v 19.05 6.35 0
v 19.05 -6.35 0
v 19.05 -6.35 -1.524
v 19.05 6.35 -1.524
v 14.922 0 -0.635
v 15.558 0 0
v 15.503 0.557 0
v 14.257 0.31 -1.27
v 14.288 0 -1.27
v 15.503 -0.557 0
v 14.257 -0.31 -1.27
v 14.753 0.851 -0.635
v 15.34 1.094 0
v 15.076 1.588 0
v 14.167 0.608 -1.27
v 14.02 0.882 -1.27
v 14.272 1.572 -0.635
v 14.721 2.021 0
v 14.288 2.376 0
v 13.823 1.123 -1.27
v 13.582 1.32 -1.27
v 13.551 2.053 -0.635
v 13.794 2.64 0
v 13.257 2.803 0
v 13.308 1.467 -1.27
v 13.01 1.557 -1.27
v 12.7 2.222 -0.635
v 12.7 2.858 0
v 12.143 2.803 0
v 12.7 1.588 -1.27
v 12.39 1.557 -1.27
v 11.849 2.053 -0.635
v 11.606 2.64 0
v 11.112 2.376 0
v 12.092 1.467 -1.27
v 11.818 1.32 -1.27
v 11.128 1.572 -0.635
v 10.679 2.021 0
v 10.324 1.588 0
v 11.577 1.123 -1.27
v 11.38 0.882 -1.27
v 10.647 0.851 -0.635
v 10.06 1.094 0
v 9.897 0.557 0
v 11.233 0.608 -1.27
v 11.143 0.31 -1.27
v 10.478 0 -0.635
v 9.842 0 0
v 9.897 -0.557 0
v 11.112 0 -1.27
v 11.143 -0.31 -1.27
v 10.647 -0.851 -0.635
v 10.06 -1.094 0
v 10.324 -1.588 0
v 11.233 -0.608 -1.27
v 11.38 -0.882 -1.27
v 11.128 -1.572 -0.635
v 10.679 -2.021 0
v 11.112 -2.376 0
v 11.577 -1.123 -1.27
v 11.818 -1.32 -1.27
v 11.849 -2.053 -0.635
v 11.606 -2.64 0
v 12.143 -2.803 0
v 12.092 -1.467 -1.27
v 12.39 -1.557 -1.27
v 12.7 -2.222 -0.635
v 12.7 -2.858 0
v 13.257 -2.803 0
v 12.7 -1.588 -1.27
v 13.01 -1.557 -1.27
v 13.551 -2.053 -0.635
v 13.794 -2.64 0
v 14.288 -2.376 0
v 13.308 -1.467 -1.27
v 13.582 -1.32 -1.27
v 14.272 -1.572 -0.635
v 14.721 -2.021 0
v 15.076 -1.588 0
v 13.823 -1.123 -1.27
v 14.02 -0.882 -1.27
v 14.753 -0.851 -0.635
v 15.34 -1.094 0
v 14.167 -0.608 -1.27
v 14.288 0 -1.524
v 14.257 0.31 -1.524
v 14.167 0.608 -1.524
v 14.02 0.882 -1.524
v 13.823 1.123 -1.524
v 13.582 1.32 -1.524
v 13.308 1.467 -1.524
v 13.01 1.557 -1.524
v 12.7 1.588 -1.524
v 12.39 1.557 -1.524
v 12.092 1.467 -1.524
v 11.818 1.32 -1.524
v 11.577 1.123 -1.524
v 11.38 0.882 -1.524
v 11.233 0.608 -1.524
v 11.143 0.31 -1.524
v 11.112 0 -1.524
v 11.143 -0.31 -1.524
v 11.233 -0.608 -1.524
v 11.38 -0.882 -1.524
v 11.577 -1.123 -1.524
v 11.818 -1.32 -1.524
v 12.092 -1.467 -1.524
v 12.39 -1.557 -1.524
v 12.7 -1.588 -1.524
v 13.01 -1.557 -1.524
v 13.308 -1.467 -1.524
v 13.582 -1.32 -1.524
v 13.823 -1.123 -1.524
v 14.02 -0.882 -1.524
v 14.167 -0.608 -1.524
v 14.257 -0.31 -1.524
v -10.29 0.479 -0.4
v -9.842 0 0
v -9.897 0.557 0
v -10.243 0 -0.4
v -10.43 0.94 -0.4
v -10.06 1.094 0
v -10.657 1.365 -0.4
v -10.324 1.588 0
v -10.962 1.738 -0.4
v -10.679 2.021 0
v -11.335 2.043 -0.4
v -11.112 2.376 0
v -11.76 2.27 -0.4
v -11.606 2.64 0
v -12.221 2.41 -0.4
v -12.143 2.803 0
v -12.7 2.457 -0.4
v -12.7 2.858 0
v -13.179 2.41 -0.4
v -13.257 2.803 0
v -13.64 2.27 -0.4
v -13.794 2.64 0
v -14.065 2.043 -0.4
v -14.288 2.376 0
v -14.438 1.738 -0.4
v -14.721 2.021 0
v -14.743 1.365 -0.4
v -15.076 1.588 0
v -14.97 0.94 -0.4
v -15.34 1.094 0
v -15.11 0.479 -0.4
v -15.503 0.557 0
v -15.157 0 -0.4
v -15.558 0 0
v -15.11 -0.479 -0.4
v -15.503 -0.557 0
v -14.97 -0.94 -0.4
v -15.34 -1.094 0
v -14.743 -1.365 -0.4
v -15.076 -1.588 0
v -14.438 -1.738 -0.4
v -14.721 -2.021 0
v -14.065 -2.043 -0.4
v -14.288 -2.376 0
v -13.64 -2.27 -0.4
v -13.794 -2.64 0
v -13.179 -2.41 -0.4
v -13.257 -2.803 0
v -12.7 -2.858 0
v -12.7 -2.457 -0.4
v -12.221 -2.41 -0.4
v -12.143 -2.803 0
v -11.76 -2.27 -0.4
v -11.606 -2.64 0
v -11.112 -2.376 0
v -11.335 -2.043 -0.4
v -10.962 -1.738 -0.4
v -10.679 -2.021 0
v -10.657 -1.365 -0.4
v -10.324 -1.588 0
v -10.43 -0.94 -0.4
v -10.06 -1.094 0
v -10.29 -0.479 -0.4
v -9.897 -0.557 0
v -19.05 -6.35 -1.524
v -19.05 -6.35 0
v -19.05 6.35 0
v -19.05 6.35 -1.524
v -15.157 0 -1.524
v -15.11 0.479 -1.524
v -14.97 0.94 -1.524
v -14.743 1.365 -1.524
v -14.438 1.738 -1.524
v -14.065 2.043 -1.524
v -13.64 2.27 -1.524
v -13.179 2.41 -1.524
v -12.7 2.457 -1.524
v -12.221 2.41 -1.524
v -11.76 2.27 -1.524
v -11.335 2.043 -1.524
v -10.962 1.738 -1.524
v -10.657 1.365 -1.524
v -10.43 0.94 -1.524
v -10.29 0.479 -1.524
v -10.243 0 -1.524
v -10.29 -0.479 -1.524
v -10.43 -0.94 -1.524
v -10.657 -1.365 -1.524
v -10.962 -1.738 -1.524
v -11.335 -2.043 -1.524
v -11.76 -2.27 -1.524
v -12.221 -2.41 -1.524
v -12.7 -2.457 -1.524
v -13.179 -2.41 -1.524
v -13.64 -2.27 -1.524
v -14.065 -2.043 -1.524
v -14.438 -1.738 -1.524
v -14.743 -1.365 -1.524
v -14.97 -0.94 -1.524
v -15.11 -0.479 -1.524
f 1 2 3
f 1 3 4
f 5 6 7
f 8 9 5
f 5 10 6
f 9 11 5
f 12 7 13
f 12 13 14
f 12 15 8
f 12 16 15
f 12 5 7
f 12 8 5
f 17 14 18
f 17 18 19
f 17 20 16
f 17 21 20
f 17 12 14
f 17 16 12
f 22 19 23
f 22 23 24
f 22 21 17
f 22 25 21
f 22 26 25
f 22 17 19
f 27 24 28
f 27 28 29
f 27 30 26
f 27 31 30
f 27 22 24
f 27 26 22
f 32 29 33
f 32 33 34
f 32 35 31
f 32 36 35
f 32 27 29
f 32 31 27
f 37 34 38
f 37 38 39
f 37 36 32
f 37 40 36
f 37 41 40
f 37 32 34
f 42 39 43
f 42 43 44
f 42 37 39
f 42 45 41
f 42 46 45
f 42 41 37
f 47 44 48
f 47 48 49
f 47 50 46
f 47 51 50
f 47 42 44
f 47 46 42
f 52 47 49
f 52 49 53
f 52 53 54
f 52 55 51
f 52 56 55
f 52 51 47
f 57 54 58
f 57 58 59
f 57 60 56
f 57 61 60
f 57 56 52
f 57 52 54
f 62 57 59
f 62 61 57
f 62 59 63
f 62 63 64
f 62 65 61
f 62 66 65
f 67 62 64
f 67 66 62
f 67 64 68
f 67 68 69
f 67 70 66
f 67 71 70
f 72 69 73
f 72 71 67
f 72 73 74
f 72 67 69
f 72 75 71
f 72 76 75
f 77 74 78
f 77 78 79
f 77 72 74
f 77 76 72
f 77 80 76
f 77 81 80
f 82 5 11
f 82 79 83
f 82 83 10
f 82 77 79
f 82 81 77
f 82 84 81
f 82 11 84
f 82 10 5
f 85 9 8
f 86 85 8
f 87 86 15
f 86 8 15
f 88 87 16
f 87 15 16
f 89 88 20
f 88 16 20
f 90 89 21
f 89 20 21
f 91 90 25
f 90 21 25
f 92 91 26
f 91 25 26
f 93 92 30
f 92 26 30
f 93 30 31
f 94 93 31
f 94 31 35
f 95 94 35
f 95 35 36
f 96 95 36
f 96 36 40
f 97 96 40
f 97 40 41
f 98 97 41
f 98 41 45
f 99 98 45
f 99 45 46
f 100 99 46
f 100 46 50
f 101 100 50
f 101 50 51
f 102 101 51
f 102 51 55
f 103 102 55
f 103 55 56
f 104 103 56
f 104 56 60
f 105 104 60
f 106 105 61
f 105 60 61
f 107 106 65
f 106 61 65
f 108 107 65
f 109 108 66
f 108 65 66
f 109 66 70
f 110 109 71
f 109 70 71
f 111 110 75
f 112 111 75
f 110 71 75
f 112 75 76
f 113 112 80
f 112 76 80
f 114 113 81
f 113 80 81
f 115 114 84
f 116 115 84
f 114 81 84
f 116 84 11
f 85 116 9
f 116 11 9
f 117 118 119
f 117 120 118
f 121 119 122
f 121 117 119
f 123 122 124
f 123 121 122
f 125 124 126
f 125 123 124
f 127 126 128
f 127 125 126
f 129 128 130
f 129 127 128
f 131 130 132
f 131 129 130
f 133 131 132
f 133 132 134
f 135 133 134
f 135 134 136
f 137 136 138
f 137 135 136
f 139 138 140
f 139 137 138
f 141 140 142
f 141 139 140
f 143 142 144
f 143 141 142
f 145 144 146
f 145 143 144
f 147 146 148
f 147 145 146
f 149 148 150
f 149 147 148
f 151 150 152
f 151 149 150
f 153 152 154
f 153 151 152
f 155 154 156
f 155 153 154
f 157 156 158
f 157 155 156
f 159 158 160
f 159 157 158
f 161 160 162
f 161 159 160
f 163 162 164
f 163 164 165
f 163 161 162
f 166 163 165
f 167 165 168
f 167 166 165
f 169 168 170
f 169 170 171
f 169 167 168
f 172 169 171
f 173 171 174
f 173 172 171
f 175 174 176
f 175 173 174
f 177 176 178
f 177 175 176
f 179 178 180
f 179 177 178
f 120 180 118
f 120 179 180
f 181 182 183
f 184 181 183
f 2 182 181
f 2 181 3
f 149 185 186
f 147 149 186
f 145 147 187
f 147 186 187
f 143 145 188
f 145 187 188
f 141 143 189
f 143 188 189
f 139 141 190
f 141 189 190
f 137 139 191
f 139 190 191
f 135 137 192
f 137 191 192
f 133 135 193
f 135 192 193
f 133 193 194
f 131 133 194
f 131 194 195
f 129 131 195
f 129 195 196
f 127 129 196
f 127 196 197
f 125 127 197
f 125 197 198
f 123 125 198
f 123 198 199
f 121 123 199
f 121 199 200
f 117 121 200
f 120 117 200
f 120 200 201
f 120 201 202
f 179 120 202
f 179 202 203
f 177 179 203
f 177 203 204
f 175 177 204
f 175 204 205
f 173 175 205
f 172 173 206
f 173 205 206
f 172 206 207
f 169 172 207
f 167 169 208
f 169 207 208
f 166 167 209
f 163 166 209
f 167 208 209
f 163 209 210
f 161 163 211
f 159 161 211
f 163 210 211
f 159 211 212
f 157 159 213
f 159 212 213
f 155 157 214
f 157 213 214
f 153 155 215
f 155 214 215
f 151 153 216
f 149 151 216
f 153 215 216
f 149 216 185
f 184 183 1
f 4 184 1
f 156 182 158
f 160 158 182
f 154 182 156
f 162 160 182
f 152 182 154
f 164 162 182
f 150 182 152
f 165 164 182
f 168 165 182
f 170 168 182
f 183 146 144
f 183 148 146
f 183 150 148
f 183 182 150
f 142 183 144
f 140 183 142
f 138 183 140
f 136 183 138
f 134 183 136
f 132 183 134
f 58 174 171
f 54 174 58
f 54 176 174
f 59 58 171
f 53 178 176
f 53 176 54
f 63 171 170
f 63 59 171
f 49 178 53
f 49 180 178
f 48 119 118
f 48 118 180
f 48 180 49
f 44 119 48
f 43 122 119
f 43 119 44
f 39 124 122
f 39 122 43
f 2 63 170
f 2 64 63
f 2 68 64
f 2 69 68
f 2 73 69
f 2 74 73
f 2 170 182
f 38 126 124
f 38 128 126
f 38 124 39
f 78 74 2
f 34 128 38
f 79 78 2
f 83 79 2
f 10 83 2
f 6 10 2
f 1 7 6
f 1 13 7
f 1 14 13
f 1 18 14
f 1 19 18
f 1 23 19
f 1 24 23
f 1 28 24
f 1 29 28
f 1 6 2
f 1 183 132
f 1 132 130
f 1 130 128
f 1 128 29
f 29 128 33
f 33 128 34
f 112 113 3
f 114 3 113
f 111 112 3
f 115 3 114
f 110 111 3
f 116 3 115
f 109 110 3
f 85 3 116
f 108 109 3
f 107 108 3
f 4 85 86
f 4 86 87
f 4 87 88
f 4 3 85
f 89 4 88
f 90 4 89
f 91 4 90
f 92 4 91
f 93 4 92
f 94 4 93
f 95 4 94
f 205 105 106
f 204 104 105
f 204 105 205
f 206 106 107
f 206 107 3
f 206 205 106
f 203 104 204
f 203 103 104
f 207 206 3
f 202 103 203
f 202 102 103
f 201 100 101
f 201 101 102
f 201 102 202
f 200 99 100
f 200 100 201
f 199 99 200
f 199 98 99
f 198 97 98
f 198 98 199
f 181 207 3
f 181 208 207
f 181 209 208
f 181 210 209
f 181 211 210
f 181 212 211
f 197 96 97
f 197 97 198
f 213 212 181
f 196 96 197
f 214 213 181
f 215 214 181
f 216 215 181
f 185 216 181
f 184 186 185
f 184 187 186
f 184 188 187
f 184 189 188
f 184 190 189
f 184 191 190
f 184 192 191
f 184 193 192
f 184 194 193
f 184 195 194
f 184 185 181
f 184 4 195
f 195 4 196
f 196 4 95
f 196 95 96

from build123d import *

# Parameters (mm, degrees)
SKETCH1_W                    = 38.1
SKETCH1_H                    = 12.7
BOSS_EXTRUDE1_DEPTH          = 1.524
SKETCH2_R                    = 1.5875
CUT_EXTRUDE1_DEPTH           = 21.138211837
CHAMFER1_SIZE                = 1.27
F_10_0_1935_DIAMETER_HOLE1_D = 4.9149


# Read off the part's stored shape, not the designer's step: deleteface
with BuildPart() as part:
    # Sketch1 → Boss-Extrude1 (new body)
    with BuildSketch(Plane.XY):
        Rectangle(SKETCH1_W, SKETCH1_H)
    extrude(amount=-BOSS_EXTRUDE1_DEPTH)

    # Sketch2 → Cut-Extrude1 (cut, through all)
    with BuildSketch(Plane.XY):
        with Locations((-12.7, 0)):
            Circle(SKETCH2_R)
        with Locations((-4.233333333, 0)):
            Circle(SKETCH2_R)
        with Locations((4.233333333, 0)):
            Circle(SKETCH2_R)
        with Locations((12.7, 0)):
            Circle(SKETCH2_R)
    extrude(amount=-CUT_EXTRUDE1_DEPTH, mode=Mode.SUBTRACT)

    # Chamfer1
    chamfer1_edges = [part.edges().sort_by_distance(p)[0] for p in [
        (-14.2875, 0, 0),
        (-5.820833333, 0, 0),
        (2.645833333, 0, 0),
        (11.1125, 0, 0),
    ]]
    chamfer(chamfer1_edges, length=CHAMFER1_SIZE)

    # deleteface outline → deleteface (revolve)
    with BuildSketch(Plane(origin=(-4.233333333, 0, 0), x_dir=(1, 0, 0), z_dir=(0, -1, 0))):
        Polygon((0, -1.524), (1.5875, -1.524), (1.5875, -1.27), (2.8575, 0), (0, 0), align=None)
    revolve(axis=Axis((-4.233333333, 0, 0), (0, 0, 1)))

    # deleteface 2 outline → deleteface 2 (revolve)
    with BuildSketch(Plane(origin=(4.233333333, 0, 0), x_dir=(1, 0, 0), z_dir=(0, -1, 0))):
        Polygon((0, -1.524), (1.5875, -1.524), (1.5875, -1.27), (2.8575, 0), (0, 0), align=None)
    revolve(axis=Axis((4.233333333, 0, 0), (0, 0, 1)))

    # #10 (0.1935) Diameter Hole1 (through all)
    with Locations(Plane.XY):
        with Locations((-12.7, 0)):
            Hole(F_10_0_1935_DIAMETER_HOLE1_D / 2)


solid = part.part
